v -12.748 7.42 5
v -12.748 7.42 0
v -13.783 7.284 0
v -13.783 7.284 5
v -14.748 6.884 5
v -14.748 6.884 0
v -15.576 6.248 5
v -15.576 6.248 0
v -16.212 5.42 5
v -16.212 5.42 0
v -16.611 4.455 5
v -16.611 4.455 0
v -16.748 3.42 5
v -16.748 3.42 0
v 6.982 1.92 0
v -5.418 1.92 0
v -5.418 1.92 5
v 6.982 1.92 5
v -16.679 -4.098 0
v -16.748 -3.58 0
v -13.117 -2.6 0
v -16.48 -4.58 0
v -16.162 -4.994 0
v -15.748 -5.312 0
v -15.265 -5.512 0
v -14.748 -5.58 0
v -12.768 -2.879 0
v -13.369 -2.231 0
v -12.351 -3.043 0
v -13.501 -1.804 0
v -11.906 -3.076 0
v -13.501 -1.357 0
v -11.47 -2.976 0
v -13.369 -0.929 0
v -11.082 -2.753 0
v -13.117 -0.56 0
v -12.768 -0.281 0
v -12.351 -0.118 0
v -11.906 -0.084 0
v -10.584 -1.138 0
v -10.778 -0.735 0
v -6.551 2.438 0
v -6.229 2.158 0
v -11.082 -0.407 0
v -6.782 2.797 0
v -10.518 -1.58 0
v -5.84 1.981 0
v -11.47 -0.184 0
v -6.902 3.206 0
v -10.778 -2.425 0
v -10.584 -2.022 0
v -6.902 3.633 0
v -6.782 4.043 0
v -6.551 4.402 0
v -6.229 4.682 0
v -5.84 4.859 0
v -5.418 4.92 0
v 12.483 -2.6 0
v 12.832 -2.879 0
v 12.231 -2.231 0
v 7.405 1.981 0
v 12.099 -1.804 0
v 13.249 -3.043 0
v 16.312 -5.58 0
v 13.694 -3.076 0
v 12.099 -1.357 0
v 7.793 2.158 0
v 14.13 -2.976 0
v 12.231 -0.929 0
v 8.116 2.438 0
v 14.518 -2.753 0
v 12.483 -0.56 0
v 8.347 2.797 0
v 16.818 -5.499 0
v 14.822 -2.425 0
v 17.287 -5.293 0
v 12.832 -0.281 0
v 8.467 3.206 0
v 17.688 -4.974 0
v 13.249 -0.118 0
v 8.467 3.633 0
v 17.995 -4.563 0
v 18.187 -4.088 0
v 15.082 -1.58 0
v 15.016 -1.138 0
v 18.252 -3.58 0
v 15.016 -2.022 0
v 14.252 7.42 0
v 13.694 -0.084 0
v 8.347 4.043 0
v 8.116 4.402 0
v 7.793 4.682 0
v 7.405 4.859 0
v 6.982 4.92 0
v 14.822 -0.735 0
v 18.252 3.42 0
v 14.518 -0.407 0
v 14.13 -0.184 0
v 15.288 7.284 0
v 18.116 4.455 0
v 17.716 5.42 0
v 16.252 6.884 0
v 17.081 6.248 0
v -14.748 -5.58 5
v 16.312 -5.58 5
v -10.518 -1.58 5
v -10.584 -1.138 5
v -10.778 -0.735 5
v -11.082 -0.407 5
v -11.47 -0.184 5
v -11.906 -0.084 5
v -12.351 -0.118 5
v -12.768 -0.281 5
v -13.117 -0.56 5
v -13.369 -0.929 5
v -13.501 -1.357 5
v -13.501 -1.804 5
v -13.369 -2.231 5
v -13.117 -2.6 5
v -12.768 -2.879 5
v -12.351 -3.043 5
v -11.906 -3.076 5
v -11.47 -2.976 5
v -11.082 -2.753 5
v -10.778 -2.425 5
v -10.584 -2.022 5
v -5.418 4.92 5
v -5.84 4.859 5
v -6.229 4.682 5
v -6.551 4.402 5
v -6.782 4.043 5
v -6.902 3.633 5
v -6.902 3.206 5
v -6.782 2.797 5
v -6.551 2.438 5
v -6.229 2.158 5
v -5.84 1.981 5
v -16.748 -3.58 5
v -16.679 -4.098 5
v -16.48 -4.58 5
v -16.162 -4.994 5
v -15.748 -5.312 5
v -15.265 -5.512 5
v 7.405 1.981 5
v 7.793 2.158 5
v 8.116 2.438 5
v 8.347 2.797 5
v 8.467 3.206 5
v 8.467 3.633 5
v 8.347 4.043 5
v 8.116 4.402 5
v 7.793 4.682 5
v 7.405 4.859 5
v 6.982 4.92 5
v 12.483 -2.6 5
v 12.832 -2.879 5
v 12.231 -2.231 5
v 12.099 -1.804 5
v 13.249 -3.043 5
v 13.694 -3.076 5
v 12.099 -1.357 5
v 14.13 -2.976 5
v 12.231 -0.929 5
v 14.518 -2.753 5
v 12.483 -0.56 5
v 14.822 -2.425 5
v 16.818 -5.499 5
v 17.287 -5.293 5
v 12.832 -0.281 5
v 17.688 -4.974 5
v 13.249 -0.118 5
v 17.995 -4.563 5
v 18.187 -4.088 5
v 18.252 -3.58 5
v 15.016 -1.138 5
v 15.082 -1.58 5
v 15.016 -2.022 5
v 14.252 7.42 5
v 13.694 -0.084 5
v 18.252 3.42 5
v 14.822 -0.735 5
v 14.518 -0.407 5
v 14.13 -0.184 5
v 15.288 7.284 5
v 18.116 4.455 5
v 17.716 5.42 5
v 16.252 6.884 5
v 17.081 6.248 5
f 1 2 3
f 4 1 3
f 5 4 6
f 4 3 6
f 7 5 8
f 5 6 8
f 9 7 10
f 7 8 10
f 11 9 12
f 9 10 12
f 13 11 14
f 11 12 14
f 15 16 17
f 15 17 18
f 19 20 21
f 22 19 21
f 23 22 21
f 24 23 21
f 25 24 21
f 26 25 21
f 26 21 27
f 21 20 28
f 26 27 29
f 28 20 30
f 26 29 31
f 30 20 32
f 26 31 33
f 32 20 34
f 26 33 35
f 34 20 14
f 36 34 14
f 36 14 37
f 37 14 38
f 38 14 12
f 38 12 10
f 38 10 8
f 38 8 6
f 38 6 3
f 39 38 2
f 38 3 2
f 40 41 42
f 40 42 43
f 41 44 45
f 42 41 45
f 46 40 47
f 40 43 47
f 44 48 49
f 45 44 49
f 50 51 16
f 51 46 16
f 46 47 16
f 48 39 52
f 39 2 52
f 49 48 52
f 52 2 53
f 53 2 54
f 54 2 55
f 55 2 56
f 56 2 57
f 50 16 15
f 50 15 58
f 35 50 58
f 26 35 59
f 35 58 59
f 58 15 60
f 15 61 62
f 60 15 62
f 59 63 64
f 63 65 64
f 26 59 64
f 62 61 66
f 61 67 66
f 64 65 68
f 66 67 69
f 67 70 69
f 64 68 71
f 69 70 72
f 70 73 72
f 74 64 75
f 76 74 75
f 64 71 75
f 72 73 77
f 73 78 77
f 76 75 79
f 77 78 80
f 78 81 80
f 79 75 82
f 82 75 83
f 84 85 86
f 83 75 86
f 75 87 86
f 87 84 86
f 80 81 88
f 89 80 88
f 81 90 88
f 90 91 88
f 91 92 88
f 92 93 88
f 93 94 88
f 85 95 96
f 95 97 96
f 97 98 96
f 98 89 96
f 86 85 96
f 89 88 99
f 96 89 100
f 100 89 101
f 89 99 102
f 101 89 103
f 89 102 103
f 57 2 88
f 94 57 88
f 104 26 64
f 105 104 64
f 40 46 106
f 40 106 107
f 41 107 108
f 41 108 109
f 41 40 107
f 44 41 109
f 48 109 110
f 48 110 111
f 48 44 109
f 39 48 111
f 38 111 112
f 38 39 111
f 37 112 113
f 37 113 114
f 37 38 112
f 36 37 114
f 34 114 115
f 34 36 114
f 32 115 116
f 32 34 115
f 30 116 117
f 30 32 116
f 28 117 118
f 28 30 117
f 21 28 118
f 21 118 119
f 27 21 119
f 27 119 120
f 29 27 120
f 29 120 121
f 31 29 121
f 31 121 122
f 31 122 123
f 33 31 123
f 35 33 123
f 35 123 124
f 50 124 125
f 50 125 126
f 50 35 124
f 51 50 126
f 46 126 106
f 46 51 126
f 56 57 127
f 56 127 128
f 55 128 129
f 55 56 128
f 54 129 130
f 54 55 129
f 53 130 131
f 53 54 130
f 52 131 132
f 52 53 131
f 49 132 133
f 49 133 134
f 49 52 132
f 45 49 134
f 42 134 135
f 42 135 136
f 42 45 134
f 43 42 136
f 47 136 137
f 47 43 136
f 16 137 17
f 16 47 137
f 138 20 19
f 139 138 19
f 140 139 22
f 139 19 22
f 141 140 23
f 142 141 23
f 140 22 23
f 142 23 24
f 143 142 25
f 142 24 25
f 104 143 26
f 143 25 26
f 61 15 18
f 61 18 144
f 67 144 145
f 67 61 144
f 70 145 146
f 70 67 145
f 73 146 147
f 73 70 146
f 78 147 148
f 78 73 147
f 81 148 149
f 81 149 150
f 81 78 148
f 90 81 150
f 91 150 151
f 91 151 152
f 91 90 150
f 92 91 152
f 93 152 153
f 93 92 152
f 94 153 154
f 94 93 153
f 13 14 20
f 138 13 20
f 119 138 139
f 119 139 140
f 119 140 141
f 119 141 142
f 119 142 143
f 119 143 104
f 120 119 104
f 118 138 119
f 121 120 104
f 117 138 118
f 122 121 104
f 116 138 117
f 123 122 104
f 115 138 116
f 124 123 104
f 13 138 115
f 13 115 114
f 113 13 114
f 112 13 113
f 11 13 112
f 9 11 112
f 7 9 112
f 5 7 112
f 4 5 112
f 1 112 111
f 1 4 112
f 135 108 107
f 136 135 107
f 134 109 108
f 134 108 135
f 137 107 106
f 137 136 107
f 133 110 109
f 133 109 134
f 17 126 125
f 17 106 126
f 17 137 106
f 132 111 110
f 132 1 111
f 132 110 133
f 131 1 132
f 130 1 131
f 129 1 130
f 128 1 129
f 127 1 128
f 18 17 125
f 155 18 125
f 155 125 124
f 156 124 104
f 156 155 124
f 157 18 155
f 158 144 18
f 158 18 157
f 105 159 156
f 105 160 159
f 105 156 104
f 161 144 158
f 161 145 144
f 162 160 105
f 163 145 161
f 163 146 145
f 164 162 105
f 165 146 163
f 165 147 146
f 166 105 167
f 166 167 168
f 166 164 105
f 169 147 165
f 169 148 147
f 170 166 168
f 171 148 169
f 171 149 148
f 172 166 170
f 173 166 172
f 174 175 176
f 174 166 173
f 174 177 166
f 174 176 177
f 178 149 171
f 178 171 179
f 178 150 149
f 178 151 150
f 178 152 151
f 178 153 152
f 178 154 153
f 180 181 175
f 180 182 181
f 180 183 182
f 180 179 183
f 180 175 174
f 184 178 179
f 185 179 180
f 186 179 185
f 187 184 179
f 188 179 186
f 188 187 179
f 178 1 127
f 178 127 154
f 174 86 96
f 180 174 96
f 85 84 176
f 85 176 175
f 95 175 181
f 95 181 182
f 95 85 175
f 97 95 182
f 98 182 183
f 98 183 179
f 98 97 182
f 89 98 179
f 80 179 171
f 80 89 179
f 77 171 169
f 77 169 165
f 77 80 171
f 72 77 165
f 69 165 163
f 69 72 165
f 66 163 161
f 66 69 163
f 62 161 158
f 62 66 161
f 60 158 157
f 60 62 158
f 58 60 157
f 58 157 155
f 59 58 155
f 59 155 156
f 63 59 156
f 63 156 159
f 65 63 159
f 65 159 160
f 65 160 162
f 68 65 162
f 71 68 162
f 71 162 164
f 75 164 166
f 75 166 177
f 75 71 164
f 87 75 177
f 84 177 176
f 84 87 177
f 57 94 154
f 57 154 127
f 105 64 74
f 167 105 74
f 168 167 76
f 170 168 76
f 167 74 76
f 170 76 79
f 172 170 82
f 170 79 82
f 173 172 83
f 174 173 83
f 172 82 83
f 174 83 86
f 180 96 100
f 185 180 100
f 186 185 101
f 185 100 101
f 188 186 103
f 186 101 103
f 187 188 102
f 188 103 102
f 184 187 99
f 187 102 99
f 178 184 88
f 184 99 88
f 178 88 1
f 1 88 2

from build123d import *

# Parameters (mm, degrees)
ESQUISSE1_R        = 1.5
BOSS_EXTRU_1_DEPTH = 5


with BuildPart() as part:
    # Esquisse1 → Boss.-Extru.1 (new body)
    with BuildSketch(Plane.XY):
        with BuildLine():
            Line((18.252383146, -3.580169779), (18.252383146, 3.419830221))
            ThreePointArc((18.252383146, 3.419830221), (17.08081027, 6.248257345), (14.252383146, 7.419830221))
            Line((14.252383146, 7.419830221), (-12.747616854, 7.419830221))
            ThreePointArc((-12.747616854, 7.419830221), (-15.576043979, 6.248257345), (-16.747616854, 3.419830221))
            Line((-16.747616854, 3.419830221), (-16.747616854, -3.580169779))
            ThreePointArc((-16.747616854, -3.580169779), (-16.161830417, -4.994383342), (-14.747616854, -5.580169779))
            Line((-14.747616854, -5.580169779), (16.312383146, -5.580169779))
            ThreePointArc((16.312383146, -5.580169779), (17.687966708, -4.973585835), (18.252383146, -3.580169779))
        make_face()
        with Locations((13.582383146, -1.580169779)):
            Circle(ESQUISSE1_R, mode=Mode.SUBTRACT)
        with Locations((-12.017616854, -1.580169779)):
            Circle(ESQUISSE1_R, mode=Mode.SUBTRACT)
        with BuildLine():
            Line((-5.417616854, 1.919830221), (6.982383146, 1.919830221))
            ThreePointArc((6.982383146, 1.919830221), (8.482383146, 3.419830221), (6.982383146, 4.919830221))
            Line((6.982383146, 4.919830221), (-5.417616854, 4.919830221))
            ThreePointArc((-5.417616854, 4.919830221), (-6.917616854, 3.419830221), (-5.417616854, 1.919830221))
        make_face(mode=Mode.SUBTRACT)
    extrude(amount=BOSS_EXTRU_1_DEPTH)


solid = part.part
